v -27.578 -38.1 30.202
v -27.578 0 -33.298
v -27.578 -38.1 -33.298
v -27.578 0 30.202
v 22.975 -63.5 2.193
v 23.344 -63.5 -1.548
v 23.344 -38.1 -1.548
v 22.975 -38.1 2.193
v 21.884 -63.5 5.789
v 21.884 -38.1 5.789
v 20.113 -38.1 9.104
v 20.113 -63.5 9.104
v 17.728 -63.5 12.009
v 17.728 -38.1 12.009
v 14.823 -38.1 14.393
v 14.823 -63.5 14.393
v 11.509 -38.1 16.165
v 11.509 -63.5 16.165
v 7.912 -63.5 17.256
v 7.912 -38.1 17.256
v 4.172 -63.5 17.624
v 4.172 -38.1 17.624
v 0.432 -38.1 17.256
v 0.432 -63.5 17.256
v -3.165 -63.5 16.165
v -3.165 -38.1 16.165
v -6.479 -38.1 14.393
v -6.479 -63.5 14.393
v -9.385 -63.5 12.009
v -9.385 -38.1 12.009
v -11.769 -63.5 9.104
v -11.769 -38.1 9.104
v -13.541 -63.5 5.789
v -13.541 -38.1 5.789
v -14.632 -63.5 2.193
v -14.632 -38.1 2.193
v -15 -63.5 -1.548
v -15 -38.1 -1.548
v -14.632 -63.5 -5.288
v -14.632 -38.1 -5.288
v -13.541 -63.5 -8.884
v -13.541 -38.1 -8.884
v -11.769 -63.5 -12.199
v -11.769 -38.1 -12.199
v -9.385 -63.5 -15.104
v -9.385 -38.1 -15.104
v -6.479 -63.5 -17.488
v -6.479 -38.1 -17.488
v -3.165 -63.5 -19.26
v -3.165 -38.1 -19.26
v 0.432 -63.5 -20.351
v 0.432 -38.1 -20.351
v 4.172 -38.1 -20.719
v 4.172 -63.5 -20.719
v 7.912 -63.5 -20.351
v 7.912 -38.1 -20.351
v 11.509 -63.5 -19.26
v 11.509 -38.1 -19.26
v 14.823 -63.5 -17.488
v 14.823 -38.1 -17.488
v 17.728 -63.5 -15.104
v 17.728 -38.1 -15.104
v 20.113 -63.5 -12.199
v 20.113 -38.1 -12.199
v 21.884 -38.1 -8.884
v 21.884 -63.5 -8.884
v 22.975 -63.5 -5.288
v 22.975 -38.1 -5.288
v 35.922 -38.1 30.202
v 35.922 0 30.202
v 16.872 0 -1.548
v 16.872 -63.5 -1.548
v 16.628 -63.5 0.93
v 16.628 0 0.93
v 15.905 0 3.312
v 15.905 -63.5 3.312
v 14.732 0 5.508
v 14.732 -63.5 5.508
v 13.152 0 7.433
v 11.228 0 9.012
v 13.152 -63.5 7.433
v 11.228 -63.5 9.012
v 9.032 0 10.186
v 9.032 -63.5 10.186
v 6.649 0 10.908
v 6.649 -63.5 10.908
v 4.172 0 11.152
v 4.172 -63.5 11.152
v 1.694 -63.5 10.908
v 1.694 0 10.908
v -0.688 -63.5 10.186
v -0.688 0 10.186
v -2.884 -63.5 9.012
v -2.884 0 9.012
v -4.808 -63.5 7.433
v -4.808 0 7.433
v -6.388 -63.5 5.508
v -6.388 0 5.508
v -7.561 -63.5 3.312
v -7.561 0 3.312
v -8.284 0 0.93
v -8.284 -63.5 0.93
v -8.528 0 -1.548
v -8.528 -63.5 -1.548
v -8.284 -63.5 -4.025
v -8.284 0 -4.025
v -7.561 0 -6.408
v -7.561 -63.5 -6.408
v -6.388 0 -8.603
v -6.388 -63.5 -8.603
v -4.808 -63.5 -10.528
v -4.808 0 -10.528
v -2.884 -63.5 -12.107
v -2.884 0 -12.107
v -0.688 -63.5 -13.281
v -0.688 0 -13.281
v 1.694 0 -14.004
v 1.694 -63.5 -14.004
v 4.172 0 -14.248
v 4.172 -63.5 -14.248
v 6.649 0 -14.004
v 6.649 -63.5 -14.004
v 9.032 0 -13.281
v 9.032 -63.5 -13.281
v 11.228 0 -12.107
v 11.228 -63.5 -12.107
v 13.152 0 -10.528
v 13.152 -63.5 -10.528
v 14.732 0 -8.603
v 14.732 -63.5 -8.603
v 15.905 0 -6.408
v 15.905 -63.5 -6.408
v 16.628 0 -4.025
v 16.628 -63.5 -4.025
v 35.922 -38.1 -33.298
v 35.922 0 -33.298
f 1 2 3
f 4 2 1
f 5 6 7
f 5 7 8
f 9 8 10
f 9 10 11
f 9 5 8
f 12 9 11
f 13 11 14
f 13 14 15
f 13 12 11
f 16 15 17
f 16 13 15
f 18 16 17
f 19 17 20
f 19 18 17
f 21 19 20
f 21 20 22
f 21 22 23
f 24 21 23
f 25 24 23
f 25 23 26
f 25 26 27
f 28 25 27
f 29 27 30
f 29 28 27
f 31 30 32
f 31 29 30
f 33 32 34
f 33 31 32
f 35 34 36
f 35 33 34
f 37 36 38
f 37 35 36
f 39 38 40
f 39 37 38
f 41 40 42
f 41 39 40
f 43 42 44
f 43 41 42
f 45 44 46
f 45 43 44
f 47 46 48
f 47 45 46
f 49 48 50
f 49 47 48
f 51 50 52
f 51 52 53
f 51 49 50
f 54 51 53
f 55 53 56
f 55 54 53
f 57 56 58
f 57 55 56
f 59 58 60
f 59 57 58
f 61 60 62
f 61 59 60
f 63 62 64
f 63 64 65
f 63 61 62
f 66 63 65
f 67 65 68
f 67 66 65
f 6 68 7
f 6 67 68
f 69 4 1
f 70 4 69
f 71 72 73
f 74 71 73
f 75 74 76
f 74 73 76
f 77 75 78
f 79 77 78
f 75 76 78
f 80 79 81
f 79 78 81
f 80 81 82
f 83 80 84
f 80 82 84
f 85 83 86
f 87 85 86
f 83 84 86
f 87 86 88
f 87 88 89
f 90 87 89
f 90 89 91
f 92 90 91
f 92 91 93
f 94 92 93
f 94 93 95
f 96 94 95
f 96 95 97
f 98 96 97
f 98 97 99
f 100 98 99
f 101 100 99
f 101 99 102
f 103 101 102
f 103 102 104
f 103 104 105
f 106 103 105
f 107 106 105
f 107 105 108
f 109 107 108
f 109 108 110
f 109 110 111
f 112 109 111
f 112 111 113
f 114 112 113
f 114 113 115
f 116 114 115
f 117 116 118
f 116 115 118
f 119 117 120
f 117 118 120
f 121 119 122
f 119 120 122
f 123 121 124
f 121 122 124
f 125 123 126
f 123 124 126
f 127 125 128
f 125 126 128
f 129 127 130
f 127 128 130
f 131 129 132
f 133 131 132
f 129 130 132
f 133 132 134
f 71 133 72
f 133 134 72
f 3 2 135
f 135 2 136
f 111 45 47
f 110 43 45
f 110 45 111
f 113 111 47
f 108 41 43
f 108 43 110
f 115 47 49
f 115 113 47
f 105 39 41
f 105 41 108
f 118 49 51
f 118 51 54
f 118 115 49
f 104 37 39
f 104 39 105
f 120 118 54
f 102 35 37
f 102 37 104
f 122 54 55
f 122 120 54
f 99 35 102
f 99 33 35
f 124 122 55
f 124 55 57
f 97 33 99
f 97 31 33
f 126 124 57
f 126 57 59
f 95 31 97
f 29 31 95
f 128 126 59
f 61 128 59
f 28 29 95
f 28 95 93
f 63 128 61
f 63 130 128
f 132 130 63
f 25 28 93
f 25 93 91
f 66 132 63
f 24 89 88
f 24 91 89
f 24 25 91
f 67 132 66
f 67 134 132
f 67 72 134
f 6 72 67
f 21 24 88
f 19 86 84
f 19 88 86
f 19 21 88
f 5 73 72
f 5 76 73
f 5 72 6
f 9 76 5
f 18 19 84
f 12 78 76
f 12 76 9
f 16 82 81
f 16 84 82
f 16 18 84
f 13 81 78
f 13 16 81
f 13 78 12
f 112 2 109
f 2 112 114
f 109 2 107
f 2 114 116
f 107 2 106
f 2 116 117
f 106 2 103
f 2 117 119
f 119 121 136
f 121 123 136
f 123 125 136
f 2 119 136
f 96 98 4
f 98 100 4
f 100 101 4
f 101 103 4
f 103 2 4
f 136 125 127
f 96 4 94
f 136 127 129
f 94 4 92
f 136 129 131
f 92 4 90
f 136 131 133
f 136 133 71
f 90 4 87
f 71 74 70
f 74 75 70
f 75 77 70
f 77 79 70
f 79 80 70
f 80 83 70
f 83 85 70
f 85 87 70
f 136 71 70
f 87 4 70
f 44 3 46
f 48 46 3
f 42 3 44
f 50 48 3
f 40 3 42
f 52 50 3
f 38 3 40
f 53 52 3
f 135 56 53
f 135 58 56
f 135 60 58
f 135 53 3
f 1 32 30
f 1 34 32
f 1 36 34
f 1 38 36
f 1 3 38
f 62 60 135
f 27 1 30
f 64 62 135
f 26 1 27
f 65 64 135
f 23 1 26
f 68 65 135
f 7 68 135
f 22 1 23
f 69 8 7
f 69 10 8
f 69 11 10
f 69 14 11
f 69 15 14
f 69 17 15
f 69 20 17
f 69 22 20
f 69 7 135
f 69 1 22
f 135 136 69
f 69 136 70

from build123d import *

# Parameters (mm, degrees)
F0_W     = 63.5
F0_H     = 63.5
F1_DEPTH = 63.5
F2_W     = 63.5
F2_H     = 63.5
F2_R     = 19.171796
F3_DEPTH = 25.4
F4_R     = 12.7
F5_DEPTH = 63.754


with BuildPart() as f1:
    # F0 (on Front) → F1 (new body)
    with BuildSketch(Plane.XZ):
        with Locations((4.171845, -1.547694)):
            Rectangle(F0_W, F0_H)
    extrude(amount=F1_DEPTH)

    # F2 (on face) → F3 (cut)
    with BuildSketch(Plane.XZ.offset(63.5)):
        with Locations((4.171845, -1.547694)):
            Rectangle(F2_W, F2_H)
        with Locations((4.171845, -1.547694)):
            Circle(F2_R, mode=Mode.SUBTRACT)
    extrude(amount=-F3_DEPTH, mode=Mode.SUBTRACT)

    # F4 (on face) → F5 (cut)
    with BuildSketch(Plane.XZ.offset(63.5)):
        with Locations((4.171845, -1.547694)):
            Circle(F4_R)
    extrude(amount=-F5_DEPTH, mode=Mode.SUBTRACT)


solid = f1.part
